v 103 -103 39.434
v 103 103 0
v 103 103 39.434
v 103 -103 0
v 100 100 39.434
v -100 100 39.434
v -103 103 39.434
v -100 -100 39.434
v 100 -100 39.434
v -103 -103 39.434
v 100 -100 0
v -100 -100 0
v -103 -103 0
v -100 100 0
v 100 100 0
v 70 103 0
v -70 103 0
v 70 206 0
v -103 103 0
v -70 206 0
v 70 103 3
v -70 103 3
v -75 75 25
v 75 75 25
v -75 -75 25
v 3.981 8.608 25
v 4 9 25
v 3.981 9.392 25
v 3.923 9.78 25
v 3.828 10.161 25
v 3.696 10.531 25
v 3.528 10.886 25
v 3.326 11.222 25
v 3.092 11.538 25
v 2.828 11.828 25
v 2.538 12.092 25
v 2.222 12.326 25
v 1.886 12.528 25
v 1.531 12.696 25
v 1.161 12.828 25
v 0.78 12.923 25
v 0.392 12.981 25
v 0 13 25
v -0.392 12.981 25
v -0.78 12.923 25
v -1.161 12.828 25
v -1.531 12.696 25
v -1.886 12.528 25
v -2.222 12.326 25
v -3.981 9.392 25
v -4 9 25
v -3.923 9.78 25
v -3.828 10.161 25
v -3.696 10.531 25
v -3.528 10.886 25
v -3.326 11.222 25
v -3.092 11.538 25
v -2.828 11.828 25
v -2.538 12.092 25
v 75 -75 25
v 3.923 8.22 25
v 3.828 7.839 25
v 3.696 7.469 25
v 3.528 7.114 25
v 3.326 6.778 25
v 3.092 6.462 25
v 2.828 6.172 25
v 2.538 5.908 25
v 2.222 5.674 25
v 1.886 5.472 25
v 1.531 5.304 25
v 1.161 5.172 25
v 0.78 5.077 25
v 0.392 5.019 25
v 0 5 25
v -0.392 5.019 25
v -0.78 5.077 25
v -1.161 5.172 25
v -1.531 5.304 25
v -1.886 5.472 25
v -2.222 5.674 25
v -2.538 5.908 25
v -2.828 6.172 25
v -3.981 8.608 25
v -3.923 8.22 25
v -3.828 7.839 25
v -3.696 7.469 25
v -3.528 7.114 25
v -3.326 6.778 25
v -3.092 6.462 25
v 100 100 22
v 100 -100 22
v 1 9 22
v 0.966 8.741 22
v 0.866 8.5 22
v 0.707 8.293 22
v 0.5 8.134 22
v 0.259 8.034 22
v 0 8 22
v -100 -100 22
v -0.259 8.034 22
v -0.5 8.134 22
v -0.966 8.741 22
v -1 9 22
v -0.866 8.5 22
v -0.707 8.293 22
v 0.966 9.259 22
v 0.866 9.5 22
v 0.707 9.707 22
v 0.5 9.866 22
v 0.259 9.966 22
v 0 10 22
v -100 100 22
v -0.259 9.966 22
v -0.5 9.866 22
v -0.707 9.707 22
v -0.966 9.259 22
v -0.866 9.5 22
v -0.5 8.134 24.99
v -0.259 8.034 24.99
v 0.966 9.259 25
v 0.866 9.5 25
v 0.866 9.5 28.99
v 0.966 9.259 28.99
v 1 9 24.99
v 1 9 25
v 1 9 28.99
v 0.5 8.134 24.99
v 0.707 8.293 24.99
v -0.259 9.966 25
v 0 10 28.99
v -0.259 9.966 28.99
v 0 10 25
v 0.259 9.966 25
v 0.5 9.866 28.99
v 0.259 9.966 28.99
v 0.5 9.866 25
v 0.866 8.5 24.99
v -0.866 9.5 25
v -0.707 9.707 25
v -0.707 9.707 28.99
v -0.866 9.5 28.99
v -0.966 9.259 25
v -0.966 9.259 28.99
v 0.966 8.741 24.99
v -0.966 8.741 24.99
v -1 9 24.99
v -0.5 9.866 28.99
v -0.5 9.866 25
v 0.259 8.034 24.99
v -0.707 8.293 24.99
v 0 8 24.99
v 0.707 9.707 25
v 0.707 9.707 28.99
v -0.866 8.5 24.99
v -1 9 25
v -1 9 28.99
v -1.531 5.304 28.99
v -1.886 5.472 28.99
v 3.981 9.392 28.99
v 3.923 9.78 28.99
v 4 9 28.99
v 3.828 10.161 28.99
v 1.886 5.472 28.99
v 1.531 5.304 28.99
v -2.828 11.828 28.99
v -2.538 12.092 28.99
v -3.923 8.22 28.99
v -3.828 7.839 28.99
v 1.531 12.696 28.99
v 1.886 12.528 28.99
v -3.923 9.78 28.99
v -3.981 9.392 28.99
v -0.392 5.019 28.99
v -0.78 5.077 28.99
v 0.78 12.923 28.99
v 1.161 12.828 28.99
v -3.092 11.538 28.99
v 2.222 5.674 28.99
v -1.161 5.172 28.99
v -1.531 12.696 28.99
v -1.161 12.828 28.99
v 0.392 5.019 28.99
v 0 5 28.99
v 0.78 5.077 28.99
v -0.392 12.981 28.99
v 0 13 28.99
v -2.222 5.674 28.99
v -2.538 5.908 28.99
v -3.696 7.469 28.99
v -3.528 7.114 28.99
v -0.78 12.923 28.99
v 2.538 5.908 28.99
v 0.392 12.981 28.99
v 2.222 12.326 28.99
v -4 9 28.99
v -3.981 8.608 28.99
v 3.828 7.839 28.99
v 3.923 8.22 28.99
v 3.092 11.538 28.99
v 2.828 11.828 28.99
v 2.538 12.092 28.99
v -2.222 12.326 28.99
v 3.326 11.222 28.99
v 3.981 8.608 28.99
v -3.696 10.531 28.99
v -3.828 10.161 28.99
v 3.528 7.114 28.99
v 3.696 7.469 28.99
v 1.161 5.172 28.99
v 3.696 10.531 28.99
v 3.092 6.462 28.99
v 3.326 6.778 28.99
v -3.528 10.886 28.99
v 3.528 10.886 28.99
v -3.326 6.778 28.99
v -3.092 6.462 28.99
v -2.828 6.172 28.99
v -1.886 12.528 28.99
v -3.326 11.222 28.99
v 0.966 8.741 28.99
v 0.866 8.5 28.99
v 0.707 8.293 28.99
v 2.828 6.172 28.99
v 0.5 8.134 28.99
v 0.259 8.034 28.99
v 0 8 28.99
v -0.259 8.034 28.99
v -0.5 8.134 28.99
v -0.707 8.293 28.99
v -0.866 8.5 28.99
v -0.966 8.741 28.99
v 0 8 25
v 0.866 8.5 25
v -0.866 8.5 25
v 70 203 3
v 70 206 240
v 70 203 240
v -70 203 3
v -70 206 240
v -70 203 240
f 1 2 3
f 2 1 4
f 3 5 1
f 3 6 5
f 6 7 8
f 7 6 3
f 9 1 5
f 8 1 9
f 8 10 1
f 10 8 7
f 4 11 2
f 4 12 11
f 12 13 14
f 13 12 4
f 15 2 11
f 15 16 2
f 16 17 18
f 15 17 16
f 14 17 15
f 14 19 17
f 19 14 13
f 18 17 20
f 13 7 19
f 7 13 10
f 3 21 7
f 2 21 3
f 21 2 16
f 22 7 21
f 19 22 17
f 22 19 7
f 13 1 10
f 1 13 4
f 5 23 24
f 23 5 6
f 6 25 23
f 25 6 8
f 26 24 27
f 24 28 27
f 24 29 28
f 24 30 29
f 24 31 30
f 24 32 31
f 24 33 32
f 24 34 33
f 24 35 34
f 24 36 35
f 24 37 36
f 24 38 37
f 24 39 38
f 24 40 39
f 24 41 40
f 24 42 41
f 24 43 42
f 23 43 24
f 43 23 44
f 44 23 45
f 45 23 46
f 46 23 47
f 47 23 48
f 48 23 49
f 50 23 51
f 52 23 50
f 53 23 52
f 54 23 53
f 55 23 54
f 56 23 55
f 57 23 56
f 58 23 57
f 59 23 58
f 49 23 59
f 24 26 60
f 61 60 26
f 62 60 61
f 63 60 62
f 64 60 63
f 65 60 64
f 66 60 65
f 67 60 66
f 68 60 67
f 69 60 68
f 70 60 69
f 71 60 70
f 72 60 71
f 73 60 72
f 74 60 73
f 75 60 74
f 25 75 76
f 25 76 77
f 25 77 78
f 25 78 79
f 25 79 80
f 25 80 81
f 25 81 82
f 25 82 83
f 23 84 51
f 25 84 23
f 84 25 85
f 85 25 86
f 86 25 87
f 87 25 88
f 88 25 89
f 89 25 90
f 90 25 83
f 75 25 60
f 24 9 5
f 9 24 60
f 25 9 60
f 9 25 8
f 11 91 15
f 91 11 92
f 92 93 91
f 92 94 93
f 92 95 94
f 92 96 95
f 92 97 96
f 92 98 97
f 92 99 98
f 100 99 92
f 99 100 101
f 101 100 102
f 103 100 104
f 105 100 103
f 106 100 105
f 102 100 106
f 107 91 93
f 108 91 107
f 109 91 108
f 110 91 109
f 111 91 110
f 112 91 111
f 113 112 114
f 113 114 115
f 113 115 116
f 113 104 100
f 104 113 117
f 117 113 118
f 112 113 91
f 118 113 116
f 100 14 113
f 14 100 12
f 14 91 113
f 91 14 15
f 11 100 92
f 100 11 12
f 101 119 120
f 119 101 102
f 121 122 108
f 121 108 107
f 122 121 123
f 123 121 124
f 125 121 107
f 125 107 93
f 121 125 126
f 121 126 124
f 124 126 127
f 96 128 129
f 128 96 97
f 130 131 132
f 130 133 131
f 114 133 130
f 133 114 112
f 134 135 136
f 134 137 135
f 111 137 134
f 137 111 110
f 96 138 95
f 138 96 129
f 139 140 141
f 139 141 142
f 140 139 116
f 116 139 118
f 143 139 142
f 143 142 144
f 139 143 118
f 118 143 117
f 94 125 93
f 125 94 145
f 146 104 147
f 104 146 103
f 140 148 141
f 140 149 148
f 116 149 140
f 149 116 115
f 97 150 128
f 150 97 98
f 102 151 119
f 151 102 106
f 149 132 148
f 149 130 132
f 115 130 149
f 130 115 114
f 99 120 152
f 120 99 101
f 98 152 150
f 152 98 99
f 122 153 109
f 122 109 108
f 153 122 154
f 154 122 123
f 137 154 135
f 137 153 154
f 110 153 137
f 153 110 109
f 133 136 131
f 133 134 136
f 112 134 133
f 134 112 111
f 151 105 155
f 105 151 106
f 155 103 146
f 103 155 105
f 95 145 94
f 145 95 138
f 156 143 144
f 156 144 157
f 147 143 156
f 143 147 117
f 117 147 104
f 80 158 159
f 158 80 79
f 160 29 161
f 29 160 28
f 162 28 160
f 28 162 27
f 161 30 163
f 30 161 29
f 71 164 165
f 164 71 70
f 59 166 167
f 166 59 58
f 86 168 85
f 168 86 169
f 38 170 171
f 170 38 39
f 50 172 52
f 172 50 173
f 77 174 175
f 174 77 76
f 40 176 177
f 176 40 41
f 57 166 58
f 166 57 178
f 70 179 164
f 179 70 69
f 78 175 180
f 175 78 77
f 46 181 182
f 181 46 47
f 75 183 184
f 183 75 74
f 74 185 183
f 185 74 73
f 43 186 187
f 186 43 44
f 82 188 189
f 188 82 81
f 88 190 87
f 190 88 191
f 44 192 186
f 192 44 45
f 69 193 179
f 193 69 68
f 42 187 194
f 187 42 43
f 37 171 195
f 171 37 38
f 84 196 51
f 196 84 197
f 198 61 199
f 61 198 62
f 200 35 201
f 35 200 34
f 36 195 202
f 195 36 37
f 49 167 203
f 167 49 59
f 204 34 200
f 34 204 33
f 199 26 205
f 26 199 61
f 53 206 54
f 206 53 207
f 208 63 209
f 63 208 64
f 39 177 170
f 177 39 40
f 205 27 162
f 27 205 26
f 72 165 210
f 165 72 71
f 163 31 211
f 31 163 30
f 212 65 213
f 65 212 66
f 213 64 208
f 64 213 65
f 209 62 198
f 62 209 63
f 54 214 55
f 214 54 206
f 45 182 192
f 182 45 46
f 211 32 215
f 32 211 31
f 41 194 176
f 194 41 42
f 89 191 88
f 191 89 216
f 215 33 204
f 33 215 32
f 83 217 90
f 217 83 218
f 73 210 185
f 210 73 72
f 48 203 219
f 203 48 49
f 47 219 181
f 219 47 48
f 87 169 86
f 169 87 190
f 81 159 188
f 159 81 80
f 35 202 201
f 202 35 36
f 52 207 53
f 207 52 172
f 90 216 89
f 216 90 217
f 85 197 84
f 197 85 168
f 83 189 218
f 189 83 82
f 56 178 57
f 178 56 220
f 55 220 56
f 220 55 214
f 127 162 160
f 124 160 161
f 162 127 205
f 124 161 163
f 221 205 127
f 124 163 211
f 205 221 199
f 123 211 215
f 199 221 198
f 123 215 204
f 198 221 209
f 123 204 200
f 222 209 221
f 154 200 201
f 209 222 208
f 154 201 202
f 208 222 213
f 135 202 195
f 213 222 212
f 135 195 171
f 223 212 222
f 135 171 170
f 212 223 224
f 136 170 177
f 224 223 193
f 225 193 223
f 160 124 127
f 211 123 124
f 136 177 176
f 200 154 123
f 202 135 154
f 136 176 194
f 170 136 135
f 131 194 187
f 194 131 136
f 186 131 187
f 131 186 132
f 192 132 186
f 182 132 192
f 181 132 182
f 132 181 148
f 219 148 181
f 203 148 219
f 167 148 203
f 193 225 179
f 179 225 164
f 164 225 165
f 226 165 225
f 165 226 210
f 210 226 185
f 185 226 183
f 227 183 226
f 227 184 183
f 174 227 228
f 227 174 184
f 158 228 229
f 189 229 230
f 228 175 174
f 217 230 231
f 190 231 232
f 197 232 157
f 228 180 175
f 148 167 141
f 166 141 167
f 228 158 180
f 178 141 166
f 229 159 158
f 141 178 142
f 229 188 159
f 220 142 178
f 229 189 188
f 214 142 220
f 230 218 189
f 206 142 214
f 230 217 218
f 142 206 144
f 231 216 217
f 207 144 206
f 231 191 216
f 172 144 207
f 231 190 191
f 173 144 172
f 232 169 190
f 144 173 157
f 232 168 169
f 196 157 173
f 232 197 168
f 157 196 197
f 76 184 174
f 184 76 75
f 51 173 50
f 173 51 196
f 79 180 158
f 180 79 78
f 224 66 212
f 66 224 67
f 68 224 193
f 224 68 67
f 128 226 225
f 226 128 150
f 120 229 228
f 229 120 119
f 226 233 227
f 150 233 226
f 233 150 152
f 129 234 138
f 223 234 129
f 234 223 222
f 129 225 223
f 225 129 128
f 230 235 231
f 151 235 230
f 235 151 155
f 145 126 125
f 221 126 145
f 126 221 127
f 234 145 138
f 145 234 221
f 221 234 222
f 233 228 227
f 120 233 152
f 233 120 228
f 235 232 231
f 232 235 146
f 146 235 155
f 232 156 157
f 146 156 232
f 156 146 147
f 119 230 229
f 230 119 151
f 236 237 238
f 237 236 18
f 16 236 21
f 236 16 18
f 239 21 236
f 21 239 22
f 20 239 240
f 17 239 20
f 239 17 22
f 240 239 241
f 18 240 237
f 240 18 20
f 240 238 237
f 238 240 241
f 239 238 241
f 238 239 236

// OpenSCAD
// Dock A for the Scout 110-B. Table at Z=0, pocket floor at Z=floor_z, +Y toward the backboard
// (the Scout's forward, camera side). Same geometry as generate_dock.py, which writes the STL files.
$fn=64;
pocket=150;   // square pocket, about 0.9 mm per side around the 148.2 mm guard envelope
run=25;       // horizontal capture run of the funnel per side
slope=30;     // funnel wall angle from horizontal, above the PETG-on-PETG friction angle
wall=3; floor_z=25; floor_t=3;
boss_d=8; boss_h=4; pin_d=2; pin=[0,9];   // charge pin under the forward cradle contact
board_w=140; board_t=3; board_h=240; board_foot=100; tags=[[40,82],[40,142],[60,205]];   // [size, centre above table]; camera at Z=82 when docked
top=floor_z+run*tan(slope); opening=pocket+2*run; outer=opening+2*wall;
module body(){
  difference(){
    translate([-outer/2,-outer/2,0])cube([outer,outer,top]);
    hull(){
      translate([0,0,top+1])linear_extrude(.01)square(opening+2/tan(slope),center=true);
      translate([0,0,floor_z])linear_extrude(.01)square(pocket,center=true);
    }
    translate([-opening/2,-opening/2,-1])cube([opening,opening,floor_z-floor_t+1]);   // electronics bay, open below
    translate([pin[0],pin[1],floor_z-floor_t-1])cylinder(h=floor_t+boss_h+2,d=pin_d,$fn=24);
  }
  translate([pin[0],pin[1],floor_z-.01])difference(){
    cylinder(h=boss_h,d=boss_d);
    translate([0,0,-1])cylinder(h=boss_h+2,d=pin_d,$fn=24);
  }
}
module backboard(){   // L-shaped stand: the foot butts against the dock's +Y wall, the plate stands board_foot in front of it
  translate([-board_w/2,outer/2,0])cube([board_w,board_foot+board_t,board_t]);
  translate([-board_w/2,outer/2+board_foot,0])cube([board_w,board_t,board_h]);
}
body(); backboard();
// Tag outlines for reference only: tag36h11 ids 3k, 3k+1, 3k+2 for dock k, lowest at camera height, the 80 mm one for far acquisition.
for(t=tags)%translate([-t[0]/2,outer/2+board_foot-.1,t[1]-t[0]/2])cube([t[0],.1,t[0]]);
